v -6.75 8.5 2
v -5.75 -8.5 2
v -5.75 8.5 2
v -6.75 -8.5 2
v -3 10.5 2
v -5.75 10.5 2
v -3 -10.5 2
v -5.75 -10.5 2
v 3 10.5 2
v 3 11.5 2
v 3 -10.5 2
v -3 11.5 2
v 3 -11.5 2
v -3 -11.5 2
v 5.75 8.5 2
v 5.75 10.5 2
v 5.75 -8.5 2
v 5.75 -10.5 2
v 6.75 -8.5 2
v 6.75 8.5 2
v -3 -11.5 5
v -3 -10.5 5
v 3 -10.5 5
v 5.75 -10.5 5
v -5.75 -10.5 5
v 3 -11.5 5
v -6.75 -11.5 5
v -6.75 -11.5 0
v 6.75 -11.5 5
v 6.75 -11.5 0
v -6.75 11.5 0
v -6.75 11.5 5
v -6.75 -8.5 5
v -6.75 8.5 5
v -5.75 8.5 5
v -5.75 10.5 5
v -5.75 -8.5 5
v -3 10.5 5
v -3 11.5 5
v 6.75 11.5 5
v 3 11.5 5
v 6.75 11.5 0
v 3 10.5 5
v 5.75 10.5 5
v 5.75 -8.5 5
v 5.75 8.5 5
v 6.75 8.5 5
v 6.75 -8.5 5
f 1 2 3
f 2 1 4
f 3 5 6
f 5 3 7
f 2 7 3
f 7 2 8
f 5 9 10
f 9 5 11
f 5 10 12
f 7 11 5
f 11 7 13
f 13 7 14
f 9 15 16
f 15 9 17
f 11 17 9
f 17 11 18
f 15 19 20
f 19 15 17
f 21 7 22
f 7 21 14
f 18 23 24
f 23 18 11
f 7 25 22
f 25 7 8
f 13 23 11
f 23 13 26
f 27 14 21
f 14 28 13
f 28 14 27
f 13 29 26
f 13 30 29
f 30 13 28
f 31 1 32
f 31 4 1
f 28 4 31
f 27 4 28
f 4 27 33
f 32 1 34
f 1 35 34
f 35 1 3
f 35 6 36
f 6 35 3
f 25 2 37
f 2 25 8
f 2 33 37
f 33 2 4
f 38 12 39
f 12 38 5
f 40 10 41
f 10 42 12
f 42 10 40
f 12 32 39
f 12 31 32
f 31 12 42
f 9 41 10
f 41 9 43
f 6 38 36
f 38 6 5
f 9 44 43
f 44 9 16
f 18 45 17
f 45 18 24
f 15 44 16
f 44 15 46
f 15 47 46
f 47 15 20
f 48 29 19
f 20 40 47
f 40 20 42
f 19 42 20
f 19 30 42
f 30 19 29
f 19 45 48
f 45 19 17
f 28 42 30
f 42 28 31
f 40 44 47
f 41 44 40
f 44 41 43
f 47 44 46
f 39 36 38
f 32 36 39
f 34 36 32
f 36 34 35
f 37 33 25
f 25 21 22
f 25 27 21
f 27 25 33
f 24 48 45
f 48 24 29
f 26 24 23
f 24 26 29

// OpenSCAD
module SolenoidMount() {
  bottom_padding = 2;

  solenoid_z = 12;
  solenoid_x = 11.5;
  solenoid_y = 21;

  wall_thickness = 1;

  case_z = solenoid_z;
  case_x = solenoid_x + (wall_thickness * 2);
  case_y = solenoid_y + (wall_thickness * 2);

  shaft_width_front = 3;
  shaft_width_back = 6;
  corner_height = 3;

  union() {
    difference() {
      linear_extrude(corner_height + bottom_padding)
        square(size = [case_x, case_y], center = true);

      // Solenoid cutout
      translate([0, 0, bottom_padding])
        linear_extrude(solenoid_z)
        square(size = [solenoid_x, solenoid_y], center = true);

      for(i = [-1, 1]) {
        translate([0, i *((solenoid_y / 2) + (wall_thickness / 2)), bottom_padding])
          linear_extrude(solenoid_z)
          square(size = [shaft_width_back, wall_thickness], center = true);

        translate([i *((solenoid_x / 2) + (wall_thickness / 2)), 0, bottom_padding])
          linear_extrude(solenoid_z)
          square(size = [wall_thickness, solenoid_y - 4], center = true);
      }
    }
  }
}

SolenoidMount();
